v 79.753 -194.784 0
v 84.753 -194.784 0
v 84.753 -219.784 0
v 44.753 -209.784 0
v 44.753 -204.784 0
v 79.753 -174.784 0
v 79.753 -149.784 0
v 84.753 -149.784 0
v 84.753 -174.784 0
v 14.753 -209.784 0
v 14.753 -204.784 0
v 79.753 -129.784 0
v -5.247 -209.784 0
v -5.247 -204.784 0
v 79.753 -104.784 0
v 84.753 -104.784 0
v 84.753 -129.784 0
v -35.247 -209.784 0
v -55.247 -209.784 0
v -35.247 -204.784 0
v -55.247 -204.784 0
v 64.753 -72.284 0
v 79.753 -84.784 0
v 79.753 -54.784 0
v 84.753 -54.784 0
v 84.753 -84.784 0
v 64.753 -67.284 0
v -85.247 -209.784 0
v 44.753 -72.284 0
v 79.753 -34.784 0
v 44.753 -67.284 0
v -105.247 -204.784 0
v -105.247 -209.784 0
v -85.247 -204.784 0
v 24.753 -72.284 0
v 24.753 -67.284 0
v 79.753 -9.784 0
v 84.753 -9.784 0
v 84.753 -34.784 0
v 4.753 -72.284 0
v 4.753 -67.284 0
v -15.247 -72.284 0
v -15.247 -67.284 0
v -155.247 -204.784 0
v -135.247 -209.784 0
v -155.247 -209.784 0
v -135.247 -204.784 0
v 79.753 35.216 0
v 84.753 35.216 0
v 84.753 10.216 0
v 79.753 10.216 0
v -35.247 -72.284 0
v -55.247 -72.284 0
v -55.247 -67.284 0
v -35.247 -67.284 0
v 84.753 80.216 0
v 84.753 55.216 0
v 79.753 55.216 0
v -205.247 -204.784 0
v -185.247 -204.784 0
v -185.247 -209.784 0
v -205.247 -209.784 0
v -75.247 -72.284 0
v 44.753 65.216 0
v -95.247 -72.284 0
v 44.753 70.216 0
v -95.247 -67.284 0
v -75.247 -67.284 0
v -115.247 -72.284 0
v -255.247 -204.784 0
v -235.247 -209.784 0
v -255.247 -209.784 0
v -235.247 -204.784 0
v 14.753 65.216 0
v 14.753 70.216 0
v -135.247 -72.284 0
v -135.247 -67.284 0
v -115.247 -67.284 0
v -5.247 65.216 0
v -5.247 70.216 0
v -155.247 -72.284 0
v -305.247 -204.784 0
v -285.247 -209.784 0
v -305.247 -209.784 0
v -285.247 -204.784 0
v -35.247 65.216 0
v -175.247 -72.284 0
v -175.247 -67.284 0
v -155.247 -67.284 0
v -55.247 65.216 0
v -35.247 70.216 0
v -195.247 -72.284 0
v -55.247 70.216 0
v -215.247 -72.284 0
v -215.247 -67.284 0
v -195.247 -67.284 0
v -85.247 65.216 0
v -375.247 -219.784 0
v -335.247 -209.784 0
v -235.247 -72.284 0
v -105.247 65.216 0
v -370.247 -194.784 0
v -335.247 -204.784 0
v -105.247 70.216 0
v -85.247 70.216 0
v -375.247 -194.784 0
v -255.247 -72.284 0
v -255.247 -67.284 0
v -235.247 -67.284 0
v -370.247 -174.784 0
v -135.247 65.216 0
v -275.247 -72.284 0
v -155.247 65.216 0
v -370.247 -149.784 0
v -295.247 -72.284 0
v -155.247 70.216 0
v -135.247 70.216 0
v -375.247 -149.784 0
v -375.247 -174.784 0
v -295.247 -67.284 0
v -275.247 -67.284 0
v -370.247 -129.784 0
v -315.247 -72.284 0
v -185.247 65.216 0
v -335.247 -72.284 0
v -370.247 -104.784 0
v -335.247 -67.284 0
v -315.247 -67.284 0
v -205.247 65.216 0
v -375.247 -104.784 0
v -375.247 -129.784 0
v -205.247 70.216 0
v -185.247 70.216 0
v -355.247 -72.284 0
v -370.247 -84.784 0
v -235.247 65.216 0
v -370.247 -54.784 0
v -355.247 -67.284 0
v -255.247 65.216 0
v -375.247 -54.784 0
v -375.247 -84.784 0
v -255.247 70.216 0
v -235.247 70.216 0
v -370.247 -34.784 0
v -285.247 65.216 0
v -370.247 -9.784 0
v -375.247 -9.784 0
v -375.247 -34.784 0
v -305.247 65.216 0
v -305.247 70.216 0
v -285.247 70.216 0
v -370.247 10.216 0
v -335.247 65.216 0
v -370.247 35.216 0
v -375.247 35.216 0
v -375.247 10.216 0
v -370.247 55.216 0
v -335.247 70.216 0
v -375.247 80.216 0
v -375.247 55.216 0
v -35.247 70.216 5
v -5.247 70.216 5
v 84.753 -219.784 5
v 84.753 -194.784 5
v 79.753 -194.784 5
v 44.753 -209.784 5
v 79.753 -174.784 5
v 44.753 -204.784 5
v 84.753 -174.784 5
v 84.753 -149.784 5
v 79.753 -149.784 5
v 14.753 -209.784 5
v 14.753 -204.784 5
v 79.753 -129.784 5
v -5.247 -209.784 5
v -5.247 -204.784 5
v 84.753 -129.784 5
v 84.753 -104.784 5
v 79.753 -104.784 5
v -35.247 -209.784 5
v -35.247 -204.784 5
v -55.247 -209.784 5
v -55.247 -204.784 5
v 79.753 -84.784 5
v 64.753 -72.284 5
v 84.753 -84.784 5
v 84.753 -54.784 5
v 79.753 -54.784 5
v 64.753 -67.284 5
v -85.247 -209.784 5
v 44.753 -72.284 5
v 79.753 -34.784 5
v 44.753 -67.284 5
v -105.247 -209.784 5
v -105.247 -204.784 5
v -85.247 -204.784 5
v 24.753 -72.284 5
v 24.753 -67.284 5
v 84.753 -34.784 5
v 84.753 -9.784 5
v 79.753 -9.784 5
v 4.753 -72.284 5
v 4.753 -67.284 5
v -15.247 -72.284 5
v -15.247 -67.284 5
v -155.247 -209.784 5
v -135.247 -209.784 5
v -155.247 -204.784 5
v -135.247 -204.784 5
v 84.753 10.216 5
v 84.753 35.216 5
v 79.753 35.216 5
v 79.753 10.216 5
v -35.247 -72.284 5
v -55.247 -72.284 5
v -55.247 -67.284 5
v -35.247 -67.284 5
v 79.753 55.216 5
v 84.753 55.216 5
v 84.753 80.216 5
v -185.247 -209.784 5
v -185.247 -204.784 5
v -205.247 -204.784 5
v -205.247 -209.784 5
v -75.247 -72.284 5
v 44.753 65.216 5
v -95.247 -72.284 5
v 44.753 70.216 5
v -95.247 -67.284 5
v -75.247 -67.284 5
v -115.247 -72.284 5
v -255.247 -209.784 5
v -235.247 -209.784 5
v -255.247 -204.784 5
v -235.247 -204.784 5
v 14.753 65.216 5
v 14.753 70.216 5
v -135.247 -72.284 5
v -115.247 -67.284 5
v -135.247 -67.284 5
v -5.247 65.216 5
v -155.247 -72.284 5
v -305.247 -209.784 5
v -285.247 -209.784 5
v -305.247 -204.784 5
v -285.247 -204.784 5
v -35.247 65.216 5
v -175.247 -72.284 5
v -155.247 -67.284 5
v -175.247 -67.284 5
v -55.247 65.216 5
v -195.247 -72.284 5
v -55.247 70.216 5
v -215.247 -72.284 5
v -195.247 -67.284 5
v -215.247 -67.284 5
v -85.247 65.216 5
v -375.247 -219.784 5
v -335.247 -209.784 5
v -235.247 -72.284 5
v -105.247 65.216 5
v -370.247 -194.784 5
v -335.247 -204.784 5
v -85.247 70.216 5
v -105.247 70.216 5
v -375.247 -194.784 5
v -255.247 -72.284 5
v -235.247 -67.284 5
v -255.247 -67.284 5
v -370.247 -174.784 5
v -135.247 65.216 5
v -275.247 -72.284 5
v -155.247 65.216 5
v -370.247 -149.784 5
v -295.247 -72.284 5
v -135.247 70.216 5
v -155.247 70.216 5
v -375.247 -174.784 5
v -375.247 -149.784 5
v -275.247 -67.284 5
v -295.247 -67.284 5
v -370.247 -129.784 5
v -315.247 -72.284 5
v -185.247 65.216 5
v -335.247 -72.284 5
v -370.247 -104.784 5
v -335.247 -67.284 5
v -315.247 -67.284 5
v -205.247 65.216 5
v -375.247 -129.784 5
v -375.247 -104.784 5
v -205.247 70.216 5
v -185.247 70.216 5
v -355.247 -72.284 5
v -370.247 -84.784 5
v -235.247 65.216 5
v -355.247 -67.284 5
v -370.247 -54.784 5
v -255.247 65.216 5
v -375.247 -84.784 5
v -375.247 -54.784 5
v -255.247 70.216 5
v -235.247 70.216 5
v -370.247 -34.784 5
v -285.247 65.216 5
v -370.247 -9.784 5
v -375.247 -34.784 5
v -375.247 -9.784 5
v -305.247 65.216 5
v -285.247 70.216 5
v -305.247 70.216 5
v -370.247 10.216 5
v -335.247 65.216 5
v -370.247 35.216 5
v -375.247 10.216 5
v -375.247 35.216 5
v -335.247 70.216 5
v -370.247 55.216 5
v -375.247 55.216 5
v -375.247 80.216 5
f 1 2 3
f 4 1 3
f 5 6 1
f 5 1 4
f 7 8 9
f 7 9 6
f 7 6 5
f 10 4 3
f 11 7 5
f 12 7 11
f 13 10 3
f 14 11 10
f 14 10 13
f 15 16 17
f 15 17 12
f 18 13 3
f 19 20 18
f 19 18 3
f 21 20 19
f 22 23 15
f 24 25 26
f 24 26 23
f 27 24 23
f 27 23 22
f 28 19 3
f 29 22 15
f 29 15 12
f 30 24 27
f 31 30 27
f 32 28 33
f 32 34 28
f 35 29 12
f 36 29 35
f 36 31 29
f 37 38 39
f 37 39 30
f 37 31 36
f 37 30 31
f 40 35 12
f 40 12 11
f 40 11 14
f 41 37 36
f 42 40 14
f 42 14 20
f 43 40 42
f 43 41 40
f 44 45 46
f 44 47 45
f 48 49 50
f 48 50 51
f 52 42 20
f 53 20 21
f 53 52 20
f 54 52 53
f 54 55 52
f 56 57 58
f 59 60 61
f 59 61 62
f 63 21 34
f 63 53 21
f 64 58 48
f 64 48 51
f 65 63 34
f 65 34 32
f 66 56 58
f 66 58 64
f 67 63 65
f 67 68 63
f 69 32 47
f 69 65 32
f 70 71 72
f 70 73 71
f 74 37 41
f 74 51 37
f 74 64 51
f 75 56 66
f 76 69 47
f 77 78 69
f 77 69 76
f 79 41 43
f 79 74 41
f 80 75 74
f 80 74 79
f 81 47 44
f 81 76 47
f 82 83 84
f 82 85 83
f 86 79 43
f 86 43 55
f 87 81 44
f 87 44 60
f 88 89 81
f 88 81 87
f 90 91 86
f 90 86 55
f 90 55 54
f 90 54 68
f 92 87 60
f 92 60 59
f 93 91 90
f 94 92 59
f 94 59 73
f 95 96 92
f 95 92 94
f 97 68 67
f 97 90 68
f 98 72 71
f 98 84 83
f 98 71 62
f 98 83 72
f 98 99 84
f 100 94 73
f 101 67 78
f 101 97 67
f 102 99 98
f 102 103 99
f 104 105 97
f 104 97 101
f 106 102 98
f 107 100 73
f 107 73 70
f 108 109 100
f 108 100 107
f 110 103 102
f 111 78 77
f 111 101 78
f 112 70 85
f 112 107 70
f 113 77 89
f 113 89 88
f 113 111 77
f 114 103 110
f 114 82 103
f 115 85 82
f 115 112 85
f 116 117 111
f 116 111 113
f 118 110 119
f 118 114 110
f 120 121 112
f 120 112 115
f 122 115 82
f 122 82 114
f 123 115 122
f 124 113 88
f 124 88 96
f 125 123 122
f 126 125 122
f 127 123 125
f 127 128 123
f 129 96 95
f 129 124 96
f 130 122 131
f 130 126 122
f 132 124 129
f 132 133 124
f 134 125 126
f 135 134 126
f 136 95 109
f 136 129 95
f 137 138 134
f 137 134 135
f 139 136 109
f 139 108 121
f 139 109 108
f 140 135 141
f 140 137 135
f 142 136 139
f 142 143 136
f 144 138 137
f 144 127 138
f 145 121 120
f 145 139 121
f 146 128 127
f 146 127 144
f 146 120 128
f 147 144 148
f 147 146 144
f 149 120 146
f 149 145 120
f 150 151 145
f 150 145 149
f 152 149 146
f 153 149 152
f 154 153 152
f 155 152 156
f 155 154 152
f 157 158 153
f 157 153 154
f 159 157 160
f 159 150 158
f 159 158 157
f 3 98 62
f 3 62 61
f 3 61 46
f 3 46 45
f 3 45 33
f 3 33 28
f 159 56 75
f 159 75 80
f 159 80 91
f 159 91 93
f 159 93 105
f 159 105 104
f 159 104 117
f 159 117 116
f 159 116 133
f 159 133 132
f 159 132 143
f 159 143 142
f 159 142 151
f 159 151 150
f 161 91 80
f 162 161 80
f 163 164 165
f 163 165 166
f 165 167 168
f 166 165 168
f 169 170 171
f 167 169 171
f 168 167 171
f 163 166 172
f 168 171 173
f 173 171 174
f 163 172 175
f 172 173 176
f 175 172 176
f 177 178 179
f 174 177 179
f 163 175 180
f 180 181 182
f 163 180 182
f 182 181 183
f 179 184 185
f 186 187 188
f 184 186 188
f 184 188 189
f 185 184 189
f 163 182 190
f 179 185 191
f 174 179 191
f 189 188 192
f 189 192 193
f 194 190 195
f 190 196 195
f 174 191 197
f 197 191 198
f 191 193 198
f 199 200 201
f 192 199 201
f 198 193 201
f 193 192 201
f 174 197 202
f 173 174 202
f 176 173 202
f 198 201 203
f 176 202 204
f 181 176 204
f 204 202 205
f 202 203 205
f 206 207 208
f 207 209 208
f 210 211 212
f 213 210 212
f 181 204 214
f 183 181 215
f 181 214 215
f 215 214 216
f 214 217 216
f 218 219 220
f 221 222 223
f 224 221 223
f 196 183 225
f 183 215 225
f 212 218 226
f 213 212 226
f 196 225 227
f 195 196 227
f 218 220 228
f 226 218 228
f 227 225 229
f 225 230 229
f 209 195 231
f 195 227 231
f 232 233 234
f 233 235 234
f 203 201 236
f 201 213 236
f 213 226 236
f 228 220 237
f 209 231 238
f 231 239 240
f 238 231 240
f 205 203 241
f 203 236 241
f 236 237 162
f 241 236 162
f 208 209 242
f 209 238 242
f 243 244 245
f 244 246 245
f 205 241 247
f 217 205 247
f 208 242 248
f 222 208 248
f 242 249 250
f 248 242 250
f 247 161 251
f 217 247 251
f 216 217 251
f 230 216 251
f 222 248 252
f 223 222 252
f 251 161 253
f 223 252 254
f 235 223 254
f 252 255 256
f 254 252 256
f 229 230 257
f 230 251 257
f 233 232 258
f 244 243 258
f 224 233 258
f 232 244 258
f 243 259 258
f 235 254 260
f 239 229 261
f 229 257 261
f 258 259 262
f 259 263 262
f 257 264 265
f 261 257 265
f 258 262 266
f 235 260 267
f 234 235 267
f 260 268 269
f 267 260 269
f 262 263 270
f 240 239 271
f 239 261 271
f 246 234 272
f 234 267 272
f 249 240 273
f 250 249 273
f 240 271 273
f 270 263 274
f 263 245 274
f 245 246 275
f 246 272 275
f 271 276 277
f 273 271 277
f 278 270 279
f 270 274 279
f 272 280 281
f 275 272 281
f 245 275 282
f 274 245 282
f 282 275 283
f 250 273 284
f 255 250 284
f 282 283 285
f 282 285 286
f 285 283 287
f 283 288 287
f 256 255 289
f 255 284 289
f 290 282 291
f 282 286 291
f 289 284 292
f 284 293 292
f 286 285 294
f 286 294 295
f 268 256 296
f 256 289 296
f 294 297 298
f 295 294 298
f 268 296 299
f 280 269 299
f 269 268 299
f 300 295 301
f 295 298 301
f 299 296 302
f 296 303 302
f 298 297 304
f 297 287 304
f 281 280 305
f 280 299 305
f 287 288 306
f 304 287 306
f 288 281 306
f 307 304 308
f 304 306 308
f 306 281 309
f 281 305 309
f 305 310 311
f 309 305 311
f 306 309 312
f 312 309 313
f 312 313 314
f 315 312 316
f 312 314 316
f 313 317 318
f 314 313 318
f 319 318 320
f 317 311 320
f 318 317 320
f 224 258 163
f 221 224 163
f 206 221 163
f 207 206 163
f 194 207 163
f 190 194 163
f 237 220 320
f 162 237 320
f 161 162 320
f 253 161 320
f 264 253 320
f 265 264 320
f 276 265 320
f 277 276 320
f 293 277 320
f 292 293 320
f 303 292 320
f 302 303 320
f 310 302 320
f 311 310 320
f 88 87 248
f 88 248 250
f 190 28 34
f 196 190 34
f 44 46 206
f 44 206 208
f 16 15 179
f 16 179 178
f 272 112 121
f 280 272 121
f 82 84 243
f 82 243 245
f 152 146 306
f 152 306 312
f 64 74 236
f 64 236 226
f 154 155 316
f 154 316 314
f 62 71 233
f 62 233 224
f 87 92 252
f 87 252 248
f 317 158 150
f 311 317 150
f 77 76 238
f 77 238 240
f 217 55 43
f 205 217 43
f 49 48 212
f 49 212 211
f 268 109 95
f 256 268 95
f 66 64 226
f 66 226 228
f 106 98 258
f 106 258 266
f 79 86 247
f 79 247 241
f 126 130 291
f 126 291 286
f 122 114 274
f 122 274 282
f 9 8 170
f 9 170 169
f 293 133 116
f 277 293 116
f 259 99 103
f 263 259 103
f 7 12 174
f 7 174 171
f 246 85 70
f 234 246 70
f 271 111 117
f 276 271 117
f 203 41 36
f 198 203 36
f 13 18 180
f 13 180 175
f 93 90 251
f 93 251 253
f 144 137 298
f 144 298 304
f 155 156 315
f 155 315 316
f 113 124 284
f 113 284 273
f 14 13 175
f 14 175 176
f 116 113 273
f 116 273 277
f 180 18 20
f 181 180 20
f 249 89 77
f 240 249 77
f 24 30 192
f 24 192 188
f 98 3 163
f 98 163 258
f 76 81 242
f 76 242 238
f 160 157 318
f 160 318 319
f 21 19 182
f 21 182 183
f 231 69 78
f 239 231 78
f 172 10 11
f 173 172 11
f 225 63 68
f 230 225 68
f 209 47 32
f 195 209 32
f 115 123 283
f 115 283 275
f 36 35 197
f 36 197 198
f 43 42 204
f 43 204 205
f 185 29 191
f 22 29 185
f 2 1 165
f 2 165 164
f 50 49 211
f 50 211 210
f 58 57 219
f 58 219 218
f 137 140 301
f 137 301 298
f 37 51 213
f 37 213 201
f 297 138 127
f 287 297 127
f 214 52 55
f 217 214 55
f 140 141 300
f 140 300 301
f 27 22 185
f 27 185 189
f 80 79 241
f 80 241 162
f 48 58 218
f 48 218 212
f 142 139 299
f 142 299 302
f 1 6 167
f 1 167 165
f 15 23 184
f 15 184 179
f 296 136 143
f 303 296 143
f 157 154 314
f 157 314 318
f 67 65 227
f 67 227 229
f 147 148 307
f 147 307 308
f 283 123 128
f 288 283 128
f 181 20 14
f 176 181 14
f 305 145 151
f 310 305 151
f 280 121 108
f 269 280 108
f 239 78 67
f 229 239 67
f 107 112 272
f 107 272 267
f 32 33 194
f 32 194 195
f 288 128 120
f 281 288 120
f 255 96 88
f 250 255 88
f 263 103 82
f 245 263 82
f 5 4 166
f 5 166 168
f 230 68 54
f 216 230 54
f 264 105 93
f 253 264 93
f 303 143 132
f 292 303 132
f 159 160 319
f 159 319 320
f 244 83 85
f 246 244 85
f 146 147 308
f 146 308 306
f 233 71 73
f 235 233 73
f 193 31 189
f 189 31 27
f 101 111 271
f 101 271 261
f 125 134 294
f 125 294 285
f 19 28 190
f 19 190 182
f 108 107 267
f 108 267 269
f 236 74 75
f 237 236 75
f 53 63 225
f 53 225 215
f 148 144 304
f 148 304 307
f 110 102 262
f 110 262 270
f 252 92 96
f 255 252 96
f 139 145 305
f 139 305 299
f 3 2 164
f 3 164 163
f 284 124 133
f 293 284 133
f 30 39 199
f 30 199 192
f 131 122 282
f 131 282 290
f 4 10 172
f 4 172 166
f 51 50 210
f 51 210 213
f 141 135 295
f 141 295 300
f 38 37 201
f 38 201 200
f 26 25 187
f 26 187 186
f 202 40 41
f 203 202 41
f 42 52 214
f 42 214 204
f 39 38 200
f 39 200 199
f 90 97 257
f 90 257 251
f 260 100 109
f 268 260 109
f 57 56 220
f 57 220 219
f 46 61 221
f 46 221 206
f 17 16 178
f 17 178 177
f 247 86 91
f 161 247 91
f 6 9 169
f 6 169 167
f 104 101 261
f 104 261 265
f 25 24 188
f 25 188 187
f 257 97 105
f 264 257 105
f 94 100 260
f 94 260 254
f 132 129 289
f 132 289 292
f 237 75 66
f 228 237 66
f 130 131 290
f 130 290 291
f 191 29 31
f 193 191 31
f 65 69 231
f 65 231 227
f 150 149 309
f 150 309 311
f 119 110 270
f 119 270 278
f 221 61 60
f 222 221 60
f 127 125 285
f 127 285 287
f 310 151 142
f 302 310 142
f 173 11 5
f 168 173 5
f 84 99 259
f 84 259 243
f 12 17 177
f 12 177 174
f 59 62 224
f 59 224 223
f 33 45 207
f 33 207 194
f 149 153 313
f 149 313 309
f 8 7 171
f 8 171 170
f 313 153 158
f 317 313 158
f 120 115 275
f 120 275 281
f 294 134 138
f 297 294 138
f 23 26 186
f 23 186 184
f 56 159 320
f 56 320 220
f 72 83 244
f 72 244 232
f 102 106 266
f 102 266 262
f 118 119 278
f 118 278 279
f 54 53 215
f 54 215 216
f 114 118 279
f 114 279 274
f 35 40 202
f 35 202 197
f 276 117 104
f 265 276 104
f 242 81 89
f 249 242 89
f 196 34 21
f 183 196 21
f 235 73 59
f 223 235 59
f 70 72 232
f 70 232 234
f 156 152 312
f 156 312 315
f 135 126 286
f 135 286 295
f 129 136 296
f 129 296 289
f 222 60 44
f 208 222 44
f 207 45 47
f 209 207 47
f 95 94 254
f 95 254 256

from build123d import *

# Parameters (mm, degrees)
SKETCH1_W           = 30
SKETCH1_H           = 5
SKETCH1_W_2         = 20
BOSS_EXTRUDE1_DEPTH = 5


with BuildPart() as part:
    # Sketch1 → Boss-Extrude1 (new body)
    with BuildSketch(Plane.XY):
        Polygon((84.753464523, -219.784412909), (-375.246535477, -219.784412909), (-375.246535477, -194.784412909), (-370.246535477, -194.784412909), (-370.246535477, -174.784412909), (-375.246535477, -174.784412909), (-375.246535477, -149.784412909), (-370.246535477, -149.784412909), (-370.246535477, -129.784412909), (-375.246535477, -129.784412909), (-375.246535477, -104.784412909), (-370.246535477, -104.784412909), (-370.246535477, -84.784412909), (-375.246535477, -84.784412909), (-375.246535477, -54.784412909), (-370.246535477, -54.784412909), (-370.246535477, -34.784412909), (-375.246535477, -34.784412909), (-375.246535477, -9.784412909), (-370.246535477, -9.784412909), (-370.246535477, 10.215587091), (-375.246535477, 10.215587091), (-375.246535477, 35.215587091), (-370.246535477, 35.215587091), (-370.246535477, 55.215587091), (-375.246535477, 55.215587091), (-375.246535477, 80.215587091), (84.753464523, 80.215587091), (84.753464523, 55.215587091), (79.753464523, 55.215587091), (79.753464523, 35.215587091), (84.753464523, 35.215587091), (84.753464523, 10.215587091), (79.753464523, 10.215587091), (79.753464523, -9.784412909), (84.753464523, -9.784412909), (84.753464523, -34.784412909), (79.753464523, -34.784412909), (79.753464523, -54.784412909), (84.753464523, -54.784412909), (84.753464523, -84.784412909), (79.753464523, -84.784412909), (79.753464523, -104.784412909), (84.753464523, -104.784412909), (84.753464523, -129.784412909), (79.753464523, -129.784412909), (79.753464523, -149.784412909), (84.753464523, -149.784412909), (84.753464523, -174.784412909), (79.753464523, -174.784412909), (79.753464523, -194.784412909), (84.753464523, -194.784412909), align=None)
        with Locations((-70.246535477, -207.284412909)):
            Rectangle(SKETCH1_W, SKETCH1_H, mode=Mode.SUBTRACT)
        with Locations((-120.246535477, -207.284412909)):
            Rectangle(SKETCH1_W, SKETCH1_H, mode=Mode.SUBTRACT)
        with Locations((-20.246535477, -207.284412909)):
            Rectangle(SKETCH1_W, SKETCH1_H, mode=Mode.SUBTRACT)
        with Locations((29.753464523, -207.284412909)):
            Rectangle(SKETCH1_W, SKETCH1_H, mode=Mode.SUBTRACT)
        with Locations((-320.246535477, -207.284412909)):
            Rectangle(SKETCH1_W, SKETCH1_H, mode=Mode.SUBTRACT)
        with Locations((-270.246535477, -207.284412909)):
            Rectangle(SKETCH1_W, SKETCH1_H, mode=Mode.SUBTRACT)
        with Locations((-220.246535477, -207.284412909)):
            Rectangle(SKETCH1_W, SKETCH1_H, mode=Mode.SUBTRACT)
        with Locations((-170.246535477, -207.284412909)):
            Rectangle(SKETCH1_W, SKETCH1_H, mode=Mode.SUBTRACT)
        with Locations((-220.246535477, 67.715587091)):
            Rectangle(SKETCH1_W, SKETCH1_H, mode=Mode.SUBTRACT)
        with Locations((-170.246535477, 67.715587091)):
            Rectangle(SKETCH1_W, SKETCH1_H, mode=Mode.SUBTRACT)
        with Locations((-270.246535477, 67.715587091)):
            Rectangle(SKETCH1_W, SKETCH1_H, mode=Mode.SUBTRACT)
        with Locations((-320.246535477, 67.715587091)):
            Rectangle(SKETCH1_W, SKETCH1_H, mode=Mode.SUBTRACT)
        with Locations((29.753464523, 67.715587091)):
            Rectangle(SKETCH1_W, SKETCH1_H, mode=Mode.SUBTRACT)
        with Locations((-20.246535477, 67.715587091)):
            Rectangle(SKETCH1_W, SKETCH1_H, mode=Mode.SUBTRACT)
        with Locations((-70.246535477, 67.715587091)):
            Rectangle(SKETCH1_W, SKETCH1_H, mode=Mode.SUBTRACT)
        with Locations((-120.246535477, 67.715587091)):
            Rectangle(SKETCH1_W, SKETCH1_H, mode=Mode.SUBTRACT)
        with Locations((-185.246535477, -69.784412909)):
            Rectangle(SKETCH1_W_2, SKETCH1_H, mode=Mode.SUBTRACT)
        with Locations((-145.246535477, -69.784412909)):
            Rectangle(SKETCH1_W_2, SKETCH1_H, mode=Mode.SUBTRACT)
        with Locations((-225.246535477, -69.784412909)):
            Rectangle(SKETCH1_W_2, SKETCH1_H, mode=Mode.SUBTRACT)
        with Locations((-265.246535477, -69.784412909)):
            Rectangle(SKETCH1_W_2, SKETCH1_H, mode=Mode.SUBTRACT)
        with Locations((-305.246535477, -69.784412909)):
            Rectangle(SKETCH1_W_2, SKETCH1_H, mode=Mode.SUBTRACT)
        with Locations((-345.246535477, -69.784412909)):
            Rectangle(SKETCH1_W_2, SKETCH1_H, mode=Mode.SUBTRACT)
        with Locations((54.753464523, -69.784412909)):
            Rectangle(SKETCH1_W_2, SKETCH1_H, mode=Mode.SUBTRACT)
        with Locations((14.753464523, -69.784412909)):
            Rectangle(SKETCH1_W_2, SKETCH1_H, mode=Mode.SUBTRACT)
        with Locations((-25.246535477, -69.784412909)):
            Rectangle(SKETCH1_W_2, SKETCH1_H, mode=Mode.SUBTRACT)
        with Locations((-65.246535477, -69.784412909)):
            Rectangle(SKETCH1_W_2, SKETCH1_H, mode=Mode.SUBTRACT)
        with Locations((-105.246535477, -69.784412909)):
            Rectangle(SKETCH1_W_2, SKETCH1_H, mode=Mode.SUBTRACT)
    extrude(amount=BOSS_EXTRUDE1_DEPTH)


solid = part.part
